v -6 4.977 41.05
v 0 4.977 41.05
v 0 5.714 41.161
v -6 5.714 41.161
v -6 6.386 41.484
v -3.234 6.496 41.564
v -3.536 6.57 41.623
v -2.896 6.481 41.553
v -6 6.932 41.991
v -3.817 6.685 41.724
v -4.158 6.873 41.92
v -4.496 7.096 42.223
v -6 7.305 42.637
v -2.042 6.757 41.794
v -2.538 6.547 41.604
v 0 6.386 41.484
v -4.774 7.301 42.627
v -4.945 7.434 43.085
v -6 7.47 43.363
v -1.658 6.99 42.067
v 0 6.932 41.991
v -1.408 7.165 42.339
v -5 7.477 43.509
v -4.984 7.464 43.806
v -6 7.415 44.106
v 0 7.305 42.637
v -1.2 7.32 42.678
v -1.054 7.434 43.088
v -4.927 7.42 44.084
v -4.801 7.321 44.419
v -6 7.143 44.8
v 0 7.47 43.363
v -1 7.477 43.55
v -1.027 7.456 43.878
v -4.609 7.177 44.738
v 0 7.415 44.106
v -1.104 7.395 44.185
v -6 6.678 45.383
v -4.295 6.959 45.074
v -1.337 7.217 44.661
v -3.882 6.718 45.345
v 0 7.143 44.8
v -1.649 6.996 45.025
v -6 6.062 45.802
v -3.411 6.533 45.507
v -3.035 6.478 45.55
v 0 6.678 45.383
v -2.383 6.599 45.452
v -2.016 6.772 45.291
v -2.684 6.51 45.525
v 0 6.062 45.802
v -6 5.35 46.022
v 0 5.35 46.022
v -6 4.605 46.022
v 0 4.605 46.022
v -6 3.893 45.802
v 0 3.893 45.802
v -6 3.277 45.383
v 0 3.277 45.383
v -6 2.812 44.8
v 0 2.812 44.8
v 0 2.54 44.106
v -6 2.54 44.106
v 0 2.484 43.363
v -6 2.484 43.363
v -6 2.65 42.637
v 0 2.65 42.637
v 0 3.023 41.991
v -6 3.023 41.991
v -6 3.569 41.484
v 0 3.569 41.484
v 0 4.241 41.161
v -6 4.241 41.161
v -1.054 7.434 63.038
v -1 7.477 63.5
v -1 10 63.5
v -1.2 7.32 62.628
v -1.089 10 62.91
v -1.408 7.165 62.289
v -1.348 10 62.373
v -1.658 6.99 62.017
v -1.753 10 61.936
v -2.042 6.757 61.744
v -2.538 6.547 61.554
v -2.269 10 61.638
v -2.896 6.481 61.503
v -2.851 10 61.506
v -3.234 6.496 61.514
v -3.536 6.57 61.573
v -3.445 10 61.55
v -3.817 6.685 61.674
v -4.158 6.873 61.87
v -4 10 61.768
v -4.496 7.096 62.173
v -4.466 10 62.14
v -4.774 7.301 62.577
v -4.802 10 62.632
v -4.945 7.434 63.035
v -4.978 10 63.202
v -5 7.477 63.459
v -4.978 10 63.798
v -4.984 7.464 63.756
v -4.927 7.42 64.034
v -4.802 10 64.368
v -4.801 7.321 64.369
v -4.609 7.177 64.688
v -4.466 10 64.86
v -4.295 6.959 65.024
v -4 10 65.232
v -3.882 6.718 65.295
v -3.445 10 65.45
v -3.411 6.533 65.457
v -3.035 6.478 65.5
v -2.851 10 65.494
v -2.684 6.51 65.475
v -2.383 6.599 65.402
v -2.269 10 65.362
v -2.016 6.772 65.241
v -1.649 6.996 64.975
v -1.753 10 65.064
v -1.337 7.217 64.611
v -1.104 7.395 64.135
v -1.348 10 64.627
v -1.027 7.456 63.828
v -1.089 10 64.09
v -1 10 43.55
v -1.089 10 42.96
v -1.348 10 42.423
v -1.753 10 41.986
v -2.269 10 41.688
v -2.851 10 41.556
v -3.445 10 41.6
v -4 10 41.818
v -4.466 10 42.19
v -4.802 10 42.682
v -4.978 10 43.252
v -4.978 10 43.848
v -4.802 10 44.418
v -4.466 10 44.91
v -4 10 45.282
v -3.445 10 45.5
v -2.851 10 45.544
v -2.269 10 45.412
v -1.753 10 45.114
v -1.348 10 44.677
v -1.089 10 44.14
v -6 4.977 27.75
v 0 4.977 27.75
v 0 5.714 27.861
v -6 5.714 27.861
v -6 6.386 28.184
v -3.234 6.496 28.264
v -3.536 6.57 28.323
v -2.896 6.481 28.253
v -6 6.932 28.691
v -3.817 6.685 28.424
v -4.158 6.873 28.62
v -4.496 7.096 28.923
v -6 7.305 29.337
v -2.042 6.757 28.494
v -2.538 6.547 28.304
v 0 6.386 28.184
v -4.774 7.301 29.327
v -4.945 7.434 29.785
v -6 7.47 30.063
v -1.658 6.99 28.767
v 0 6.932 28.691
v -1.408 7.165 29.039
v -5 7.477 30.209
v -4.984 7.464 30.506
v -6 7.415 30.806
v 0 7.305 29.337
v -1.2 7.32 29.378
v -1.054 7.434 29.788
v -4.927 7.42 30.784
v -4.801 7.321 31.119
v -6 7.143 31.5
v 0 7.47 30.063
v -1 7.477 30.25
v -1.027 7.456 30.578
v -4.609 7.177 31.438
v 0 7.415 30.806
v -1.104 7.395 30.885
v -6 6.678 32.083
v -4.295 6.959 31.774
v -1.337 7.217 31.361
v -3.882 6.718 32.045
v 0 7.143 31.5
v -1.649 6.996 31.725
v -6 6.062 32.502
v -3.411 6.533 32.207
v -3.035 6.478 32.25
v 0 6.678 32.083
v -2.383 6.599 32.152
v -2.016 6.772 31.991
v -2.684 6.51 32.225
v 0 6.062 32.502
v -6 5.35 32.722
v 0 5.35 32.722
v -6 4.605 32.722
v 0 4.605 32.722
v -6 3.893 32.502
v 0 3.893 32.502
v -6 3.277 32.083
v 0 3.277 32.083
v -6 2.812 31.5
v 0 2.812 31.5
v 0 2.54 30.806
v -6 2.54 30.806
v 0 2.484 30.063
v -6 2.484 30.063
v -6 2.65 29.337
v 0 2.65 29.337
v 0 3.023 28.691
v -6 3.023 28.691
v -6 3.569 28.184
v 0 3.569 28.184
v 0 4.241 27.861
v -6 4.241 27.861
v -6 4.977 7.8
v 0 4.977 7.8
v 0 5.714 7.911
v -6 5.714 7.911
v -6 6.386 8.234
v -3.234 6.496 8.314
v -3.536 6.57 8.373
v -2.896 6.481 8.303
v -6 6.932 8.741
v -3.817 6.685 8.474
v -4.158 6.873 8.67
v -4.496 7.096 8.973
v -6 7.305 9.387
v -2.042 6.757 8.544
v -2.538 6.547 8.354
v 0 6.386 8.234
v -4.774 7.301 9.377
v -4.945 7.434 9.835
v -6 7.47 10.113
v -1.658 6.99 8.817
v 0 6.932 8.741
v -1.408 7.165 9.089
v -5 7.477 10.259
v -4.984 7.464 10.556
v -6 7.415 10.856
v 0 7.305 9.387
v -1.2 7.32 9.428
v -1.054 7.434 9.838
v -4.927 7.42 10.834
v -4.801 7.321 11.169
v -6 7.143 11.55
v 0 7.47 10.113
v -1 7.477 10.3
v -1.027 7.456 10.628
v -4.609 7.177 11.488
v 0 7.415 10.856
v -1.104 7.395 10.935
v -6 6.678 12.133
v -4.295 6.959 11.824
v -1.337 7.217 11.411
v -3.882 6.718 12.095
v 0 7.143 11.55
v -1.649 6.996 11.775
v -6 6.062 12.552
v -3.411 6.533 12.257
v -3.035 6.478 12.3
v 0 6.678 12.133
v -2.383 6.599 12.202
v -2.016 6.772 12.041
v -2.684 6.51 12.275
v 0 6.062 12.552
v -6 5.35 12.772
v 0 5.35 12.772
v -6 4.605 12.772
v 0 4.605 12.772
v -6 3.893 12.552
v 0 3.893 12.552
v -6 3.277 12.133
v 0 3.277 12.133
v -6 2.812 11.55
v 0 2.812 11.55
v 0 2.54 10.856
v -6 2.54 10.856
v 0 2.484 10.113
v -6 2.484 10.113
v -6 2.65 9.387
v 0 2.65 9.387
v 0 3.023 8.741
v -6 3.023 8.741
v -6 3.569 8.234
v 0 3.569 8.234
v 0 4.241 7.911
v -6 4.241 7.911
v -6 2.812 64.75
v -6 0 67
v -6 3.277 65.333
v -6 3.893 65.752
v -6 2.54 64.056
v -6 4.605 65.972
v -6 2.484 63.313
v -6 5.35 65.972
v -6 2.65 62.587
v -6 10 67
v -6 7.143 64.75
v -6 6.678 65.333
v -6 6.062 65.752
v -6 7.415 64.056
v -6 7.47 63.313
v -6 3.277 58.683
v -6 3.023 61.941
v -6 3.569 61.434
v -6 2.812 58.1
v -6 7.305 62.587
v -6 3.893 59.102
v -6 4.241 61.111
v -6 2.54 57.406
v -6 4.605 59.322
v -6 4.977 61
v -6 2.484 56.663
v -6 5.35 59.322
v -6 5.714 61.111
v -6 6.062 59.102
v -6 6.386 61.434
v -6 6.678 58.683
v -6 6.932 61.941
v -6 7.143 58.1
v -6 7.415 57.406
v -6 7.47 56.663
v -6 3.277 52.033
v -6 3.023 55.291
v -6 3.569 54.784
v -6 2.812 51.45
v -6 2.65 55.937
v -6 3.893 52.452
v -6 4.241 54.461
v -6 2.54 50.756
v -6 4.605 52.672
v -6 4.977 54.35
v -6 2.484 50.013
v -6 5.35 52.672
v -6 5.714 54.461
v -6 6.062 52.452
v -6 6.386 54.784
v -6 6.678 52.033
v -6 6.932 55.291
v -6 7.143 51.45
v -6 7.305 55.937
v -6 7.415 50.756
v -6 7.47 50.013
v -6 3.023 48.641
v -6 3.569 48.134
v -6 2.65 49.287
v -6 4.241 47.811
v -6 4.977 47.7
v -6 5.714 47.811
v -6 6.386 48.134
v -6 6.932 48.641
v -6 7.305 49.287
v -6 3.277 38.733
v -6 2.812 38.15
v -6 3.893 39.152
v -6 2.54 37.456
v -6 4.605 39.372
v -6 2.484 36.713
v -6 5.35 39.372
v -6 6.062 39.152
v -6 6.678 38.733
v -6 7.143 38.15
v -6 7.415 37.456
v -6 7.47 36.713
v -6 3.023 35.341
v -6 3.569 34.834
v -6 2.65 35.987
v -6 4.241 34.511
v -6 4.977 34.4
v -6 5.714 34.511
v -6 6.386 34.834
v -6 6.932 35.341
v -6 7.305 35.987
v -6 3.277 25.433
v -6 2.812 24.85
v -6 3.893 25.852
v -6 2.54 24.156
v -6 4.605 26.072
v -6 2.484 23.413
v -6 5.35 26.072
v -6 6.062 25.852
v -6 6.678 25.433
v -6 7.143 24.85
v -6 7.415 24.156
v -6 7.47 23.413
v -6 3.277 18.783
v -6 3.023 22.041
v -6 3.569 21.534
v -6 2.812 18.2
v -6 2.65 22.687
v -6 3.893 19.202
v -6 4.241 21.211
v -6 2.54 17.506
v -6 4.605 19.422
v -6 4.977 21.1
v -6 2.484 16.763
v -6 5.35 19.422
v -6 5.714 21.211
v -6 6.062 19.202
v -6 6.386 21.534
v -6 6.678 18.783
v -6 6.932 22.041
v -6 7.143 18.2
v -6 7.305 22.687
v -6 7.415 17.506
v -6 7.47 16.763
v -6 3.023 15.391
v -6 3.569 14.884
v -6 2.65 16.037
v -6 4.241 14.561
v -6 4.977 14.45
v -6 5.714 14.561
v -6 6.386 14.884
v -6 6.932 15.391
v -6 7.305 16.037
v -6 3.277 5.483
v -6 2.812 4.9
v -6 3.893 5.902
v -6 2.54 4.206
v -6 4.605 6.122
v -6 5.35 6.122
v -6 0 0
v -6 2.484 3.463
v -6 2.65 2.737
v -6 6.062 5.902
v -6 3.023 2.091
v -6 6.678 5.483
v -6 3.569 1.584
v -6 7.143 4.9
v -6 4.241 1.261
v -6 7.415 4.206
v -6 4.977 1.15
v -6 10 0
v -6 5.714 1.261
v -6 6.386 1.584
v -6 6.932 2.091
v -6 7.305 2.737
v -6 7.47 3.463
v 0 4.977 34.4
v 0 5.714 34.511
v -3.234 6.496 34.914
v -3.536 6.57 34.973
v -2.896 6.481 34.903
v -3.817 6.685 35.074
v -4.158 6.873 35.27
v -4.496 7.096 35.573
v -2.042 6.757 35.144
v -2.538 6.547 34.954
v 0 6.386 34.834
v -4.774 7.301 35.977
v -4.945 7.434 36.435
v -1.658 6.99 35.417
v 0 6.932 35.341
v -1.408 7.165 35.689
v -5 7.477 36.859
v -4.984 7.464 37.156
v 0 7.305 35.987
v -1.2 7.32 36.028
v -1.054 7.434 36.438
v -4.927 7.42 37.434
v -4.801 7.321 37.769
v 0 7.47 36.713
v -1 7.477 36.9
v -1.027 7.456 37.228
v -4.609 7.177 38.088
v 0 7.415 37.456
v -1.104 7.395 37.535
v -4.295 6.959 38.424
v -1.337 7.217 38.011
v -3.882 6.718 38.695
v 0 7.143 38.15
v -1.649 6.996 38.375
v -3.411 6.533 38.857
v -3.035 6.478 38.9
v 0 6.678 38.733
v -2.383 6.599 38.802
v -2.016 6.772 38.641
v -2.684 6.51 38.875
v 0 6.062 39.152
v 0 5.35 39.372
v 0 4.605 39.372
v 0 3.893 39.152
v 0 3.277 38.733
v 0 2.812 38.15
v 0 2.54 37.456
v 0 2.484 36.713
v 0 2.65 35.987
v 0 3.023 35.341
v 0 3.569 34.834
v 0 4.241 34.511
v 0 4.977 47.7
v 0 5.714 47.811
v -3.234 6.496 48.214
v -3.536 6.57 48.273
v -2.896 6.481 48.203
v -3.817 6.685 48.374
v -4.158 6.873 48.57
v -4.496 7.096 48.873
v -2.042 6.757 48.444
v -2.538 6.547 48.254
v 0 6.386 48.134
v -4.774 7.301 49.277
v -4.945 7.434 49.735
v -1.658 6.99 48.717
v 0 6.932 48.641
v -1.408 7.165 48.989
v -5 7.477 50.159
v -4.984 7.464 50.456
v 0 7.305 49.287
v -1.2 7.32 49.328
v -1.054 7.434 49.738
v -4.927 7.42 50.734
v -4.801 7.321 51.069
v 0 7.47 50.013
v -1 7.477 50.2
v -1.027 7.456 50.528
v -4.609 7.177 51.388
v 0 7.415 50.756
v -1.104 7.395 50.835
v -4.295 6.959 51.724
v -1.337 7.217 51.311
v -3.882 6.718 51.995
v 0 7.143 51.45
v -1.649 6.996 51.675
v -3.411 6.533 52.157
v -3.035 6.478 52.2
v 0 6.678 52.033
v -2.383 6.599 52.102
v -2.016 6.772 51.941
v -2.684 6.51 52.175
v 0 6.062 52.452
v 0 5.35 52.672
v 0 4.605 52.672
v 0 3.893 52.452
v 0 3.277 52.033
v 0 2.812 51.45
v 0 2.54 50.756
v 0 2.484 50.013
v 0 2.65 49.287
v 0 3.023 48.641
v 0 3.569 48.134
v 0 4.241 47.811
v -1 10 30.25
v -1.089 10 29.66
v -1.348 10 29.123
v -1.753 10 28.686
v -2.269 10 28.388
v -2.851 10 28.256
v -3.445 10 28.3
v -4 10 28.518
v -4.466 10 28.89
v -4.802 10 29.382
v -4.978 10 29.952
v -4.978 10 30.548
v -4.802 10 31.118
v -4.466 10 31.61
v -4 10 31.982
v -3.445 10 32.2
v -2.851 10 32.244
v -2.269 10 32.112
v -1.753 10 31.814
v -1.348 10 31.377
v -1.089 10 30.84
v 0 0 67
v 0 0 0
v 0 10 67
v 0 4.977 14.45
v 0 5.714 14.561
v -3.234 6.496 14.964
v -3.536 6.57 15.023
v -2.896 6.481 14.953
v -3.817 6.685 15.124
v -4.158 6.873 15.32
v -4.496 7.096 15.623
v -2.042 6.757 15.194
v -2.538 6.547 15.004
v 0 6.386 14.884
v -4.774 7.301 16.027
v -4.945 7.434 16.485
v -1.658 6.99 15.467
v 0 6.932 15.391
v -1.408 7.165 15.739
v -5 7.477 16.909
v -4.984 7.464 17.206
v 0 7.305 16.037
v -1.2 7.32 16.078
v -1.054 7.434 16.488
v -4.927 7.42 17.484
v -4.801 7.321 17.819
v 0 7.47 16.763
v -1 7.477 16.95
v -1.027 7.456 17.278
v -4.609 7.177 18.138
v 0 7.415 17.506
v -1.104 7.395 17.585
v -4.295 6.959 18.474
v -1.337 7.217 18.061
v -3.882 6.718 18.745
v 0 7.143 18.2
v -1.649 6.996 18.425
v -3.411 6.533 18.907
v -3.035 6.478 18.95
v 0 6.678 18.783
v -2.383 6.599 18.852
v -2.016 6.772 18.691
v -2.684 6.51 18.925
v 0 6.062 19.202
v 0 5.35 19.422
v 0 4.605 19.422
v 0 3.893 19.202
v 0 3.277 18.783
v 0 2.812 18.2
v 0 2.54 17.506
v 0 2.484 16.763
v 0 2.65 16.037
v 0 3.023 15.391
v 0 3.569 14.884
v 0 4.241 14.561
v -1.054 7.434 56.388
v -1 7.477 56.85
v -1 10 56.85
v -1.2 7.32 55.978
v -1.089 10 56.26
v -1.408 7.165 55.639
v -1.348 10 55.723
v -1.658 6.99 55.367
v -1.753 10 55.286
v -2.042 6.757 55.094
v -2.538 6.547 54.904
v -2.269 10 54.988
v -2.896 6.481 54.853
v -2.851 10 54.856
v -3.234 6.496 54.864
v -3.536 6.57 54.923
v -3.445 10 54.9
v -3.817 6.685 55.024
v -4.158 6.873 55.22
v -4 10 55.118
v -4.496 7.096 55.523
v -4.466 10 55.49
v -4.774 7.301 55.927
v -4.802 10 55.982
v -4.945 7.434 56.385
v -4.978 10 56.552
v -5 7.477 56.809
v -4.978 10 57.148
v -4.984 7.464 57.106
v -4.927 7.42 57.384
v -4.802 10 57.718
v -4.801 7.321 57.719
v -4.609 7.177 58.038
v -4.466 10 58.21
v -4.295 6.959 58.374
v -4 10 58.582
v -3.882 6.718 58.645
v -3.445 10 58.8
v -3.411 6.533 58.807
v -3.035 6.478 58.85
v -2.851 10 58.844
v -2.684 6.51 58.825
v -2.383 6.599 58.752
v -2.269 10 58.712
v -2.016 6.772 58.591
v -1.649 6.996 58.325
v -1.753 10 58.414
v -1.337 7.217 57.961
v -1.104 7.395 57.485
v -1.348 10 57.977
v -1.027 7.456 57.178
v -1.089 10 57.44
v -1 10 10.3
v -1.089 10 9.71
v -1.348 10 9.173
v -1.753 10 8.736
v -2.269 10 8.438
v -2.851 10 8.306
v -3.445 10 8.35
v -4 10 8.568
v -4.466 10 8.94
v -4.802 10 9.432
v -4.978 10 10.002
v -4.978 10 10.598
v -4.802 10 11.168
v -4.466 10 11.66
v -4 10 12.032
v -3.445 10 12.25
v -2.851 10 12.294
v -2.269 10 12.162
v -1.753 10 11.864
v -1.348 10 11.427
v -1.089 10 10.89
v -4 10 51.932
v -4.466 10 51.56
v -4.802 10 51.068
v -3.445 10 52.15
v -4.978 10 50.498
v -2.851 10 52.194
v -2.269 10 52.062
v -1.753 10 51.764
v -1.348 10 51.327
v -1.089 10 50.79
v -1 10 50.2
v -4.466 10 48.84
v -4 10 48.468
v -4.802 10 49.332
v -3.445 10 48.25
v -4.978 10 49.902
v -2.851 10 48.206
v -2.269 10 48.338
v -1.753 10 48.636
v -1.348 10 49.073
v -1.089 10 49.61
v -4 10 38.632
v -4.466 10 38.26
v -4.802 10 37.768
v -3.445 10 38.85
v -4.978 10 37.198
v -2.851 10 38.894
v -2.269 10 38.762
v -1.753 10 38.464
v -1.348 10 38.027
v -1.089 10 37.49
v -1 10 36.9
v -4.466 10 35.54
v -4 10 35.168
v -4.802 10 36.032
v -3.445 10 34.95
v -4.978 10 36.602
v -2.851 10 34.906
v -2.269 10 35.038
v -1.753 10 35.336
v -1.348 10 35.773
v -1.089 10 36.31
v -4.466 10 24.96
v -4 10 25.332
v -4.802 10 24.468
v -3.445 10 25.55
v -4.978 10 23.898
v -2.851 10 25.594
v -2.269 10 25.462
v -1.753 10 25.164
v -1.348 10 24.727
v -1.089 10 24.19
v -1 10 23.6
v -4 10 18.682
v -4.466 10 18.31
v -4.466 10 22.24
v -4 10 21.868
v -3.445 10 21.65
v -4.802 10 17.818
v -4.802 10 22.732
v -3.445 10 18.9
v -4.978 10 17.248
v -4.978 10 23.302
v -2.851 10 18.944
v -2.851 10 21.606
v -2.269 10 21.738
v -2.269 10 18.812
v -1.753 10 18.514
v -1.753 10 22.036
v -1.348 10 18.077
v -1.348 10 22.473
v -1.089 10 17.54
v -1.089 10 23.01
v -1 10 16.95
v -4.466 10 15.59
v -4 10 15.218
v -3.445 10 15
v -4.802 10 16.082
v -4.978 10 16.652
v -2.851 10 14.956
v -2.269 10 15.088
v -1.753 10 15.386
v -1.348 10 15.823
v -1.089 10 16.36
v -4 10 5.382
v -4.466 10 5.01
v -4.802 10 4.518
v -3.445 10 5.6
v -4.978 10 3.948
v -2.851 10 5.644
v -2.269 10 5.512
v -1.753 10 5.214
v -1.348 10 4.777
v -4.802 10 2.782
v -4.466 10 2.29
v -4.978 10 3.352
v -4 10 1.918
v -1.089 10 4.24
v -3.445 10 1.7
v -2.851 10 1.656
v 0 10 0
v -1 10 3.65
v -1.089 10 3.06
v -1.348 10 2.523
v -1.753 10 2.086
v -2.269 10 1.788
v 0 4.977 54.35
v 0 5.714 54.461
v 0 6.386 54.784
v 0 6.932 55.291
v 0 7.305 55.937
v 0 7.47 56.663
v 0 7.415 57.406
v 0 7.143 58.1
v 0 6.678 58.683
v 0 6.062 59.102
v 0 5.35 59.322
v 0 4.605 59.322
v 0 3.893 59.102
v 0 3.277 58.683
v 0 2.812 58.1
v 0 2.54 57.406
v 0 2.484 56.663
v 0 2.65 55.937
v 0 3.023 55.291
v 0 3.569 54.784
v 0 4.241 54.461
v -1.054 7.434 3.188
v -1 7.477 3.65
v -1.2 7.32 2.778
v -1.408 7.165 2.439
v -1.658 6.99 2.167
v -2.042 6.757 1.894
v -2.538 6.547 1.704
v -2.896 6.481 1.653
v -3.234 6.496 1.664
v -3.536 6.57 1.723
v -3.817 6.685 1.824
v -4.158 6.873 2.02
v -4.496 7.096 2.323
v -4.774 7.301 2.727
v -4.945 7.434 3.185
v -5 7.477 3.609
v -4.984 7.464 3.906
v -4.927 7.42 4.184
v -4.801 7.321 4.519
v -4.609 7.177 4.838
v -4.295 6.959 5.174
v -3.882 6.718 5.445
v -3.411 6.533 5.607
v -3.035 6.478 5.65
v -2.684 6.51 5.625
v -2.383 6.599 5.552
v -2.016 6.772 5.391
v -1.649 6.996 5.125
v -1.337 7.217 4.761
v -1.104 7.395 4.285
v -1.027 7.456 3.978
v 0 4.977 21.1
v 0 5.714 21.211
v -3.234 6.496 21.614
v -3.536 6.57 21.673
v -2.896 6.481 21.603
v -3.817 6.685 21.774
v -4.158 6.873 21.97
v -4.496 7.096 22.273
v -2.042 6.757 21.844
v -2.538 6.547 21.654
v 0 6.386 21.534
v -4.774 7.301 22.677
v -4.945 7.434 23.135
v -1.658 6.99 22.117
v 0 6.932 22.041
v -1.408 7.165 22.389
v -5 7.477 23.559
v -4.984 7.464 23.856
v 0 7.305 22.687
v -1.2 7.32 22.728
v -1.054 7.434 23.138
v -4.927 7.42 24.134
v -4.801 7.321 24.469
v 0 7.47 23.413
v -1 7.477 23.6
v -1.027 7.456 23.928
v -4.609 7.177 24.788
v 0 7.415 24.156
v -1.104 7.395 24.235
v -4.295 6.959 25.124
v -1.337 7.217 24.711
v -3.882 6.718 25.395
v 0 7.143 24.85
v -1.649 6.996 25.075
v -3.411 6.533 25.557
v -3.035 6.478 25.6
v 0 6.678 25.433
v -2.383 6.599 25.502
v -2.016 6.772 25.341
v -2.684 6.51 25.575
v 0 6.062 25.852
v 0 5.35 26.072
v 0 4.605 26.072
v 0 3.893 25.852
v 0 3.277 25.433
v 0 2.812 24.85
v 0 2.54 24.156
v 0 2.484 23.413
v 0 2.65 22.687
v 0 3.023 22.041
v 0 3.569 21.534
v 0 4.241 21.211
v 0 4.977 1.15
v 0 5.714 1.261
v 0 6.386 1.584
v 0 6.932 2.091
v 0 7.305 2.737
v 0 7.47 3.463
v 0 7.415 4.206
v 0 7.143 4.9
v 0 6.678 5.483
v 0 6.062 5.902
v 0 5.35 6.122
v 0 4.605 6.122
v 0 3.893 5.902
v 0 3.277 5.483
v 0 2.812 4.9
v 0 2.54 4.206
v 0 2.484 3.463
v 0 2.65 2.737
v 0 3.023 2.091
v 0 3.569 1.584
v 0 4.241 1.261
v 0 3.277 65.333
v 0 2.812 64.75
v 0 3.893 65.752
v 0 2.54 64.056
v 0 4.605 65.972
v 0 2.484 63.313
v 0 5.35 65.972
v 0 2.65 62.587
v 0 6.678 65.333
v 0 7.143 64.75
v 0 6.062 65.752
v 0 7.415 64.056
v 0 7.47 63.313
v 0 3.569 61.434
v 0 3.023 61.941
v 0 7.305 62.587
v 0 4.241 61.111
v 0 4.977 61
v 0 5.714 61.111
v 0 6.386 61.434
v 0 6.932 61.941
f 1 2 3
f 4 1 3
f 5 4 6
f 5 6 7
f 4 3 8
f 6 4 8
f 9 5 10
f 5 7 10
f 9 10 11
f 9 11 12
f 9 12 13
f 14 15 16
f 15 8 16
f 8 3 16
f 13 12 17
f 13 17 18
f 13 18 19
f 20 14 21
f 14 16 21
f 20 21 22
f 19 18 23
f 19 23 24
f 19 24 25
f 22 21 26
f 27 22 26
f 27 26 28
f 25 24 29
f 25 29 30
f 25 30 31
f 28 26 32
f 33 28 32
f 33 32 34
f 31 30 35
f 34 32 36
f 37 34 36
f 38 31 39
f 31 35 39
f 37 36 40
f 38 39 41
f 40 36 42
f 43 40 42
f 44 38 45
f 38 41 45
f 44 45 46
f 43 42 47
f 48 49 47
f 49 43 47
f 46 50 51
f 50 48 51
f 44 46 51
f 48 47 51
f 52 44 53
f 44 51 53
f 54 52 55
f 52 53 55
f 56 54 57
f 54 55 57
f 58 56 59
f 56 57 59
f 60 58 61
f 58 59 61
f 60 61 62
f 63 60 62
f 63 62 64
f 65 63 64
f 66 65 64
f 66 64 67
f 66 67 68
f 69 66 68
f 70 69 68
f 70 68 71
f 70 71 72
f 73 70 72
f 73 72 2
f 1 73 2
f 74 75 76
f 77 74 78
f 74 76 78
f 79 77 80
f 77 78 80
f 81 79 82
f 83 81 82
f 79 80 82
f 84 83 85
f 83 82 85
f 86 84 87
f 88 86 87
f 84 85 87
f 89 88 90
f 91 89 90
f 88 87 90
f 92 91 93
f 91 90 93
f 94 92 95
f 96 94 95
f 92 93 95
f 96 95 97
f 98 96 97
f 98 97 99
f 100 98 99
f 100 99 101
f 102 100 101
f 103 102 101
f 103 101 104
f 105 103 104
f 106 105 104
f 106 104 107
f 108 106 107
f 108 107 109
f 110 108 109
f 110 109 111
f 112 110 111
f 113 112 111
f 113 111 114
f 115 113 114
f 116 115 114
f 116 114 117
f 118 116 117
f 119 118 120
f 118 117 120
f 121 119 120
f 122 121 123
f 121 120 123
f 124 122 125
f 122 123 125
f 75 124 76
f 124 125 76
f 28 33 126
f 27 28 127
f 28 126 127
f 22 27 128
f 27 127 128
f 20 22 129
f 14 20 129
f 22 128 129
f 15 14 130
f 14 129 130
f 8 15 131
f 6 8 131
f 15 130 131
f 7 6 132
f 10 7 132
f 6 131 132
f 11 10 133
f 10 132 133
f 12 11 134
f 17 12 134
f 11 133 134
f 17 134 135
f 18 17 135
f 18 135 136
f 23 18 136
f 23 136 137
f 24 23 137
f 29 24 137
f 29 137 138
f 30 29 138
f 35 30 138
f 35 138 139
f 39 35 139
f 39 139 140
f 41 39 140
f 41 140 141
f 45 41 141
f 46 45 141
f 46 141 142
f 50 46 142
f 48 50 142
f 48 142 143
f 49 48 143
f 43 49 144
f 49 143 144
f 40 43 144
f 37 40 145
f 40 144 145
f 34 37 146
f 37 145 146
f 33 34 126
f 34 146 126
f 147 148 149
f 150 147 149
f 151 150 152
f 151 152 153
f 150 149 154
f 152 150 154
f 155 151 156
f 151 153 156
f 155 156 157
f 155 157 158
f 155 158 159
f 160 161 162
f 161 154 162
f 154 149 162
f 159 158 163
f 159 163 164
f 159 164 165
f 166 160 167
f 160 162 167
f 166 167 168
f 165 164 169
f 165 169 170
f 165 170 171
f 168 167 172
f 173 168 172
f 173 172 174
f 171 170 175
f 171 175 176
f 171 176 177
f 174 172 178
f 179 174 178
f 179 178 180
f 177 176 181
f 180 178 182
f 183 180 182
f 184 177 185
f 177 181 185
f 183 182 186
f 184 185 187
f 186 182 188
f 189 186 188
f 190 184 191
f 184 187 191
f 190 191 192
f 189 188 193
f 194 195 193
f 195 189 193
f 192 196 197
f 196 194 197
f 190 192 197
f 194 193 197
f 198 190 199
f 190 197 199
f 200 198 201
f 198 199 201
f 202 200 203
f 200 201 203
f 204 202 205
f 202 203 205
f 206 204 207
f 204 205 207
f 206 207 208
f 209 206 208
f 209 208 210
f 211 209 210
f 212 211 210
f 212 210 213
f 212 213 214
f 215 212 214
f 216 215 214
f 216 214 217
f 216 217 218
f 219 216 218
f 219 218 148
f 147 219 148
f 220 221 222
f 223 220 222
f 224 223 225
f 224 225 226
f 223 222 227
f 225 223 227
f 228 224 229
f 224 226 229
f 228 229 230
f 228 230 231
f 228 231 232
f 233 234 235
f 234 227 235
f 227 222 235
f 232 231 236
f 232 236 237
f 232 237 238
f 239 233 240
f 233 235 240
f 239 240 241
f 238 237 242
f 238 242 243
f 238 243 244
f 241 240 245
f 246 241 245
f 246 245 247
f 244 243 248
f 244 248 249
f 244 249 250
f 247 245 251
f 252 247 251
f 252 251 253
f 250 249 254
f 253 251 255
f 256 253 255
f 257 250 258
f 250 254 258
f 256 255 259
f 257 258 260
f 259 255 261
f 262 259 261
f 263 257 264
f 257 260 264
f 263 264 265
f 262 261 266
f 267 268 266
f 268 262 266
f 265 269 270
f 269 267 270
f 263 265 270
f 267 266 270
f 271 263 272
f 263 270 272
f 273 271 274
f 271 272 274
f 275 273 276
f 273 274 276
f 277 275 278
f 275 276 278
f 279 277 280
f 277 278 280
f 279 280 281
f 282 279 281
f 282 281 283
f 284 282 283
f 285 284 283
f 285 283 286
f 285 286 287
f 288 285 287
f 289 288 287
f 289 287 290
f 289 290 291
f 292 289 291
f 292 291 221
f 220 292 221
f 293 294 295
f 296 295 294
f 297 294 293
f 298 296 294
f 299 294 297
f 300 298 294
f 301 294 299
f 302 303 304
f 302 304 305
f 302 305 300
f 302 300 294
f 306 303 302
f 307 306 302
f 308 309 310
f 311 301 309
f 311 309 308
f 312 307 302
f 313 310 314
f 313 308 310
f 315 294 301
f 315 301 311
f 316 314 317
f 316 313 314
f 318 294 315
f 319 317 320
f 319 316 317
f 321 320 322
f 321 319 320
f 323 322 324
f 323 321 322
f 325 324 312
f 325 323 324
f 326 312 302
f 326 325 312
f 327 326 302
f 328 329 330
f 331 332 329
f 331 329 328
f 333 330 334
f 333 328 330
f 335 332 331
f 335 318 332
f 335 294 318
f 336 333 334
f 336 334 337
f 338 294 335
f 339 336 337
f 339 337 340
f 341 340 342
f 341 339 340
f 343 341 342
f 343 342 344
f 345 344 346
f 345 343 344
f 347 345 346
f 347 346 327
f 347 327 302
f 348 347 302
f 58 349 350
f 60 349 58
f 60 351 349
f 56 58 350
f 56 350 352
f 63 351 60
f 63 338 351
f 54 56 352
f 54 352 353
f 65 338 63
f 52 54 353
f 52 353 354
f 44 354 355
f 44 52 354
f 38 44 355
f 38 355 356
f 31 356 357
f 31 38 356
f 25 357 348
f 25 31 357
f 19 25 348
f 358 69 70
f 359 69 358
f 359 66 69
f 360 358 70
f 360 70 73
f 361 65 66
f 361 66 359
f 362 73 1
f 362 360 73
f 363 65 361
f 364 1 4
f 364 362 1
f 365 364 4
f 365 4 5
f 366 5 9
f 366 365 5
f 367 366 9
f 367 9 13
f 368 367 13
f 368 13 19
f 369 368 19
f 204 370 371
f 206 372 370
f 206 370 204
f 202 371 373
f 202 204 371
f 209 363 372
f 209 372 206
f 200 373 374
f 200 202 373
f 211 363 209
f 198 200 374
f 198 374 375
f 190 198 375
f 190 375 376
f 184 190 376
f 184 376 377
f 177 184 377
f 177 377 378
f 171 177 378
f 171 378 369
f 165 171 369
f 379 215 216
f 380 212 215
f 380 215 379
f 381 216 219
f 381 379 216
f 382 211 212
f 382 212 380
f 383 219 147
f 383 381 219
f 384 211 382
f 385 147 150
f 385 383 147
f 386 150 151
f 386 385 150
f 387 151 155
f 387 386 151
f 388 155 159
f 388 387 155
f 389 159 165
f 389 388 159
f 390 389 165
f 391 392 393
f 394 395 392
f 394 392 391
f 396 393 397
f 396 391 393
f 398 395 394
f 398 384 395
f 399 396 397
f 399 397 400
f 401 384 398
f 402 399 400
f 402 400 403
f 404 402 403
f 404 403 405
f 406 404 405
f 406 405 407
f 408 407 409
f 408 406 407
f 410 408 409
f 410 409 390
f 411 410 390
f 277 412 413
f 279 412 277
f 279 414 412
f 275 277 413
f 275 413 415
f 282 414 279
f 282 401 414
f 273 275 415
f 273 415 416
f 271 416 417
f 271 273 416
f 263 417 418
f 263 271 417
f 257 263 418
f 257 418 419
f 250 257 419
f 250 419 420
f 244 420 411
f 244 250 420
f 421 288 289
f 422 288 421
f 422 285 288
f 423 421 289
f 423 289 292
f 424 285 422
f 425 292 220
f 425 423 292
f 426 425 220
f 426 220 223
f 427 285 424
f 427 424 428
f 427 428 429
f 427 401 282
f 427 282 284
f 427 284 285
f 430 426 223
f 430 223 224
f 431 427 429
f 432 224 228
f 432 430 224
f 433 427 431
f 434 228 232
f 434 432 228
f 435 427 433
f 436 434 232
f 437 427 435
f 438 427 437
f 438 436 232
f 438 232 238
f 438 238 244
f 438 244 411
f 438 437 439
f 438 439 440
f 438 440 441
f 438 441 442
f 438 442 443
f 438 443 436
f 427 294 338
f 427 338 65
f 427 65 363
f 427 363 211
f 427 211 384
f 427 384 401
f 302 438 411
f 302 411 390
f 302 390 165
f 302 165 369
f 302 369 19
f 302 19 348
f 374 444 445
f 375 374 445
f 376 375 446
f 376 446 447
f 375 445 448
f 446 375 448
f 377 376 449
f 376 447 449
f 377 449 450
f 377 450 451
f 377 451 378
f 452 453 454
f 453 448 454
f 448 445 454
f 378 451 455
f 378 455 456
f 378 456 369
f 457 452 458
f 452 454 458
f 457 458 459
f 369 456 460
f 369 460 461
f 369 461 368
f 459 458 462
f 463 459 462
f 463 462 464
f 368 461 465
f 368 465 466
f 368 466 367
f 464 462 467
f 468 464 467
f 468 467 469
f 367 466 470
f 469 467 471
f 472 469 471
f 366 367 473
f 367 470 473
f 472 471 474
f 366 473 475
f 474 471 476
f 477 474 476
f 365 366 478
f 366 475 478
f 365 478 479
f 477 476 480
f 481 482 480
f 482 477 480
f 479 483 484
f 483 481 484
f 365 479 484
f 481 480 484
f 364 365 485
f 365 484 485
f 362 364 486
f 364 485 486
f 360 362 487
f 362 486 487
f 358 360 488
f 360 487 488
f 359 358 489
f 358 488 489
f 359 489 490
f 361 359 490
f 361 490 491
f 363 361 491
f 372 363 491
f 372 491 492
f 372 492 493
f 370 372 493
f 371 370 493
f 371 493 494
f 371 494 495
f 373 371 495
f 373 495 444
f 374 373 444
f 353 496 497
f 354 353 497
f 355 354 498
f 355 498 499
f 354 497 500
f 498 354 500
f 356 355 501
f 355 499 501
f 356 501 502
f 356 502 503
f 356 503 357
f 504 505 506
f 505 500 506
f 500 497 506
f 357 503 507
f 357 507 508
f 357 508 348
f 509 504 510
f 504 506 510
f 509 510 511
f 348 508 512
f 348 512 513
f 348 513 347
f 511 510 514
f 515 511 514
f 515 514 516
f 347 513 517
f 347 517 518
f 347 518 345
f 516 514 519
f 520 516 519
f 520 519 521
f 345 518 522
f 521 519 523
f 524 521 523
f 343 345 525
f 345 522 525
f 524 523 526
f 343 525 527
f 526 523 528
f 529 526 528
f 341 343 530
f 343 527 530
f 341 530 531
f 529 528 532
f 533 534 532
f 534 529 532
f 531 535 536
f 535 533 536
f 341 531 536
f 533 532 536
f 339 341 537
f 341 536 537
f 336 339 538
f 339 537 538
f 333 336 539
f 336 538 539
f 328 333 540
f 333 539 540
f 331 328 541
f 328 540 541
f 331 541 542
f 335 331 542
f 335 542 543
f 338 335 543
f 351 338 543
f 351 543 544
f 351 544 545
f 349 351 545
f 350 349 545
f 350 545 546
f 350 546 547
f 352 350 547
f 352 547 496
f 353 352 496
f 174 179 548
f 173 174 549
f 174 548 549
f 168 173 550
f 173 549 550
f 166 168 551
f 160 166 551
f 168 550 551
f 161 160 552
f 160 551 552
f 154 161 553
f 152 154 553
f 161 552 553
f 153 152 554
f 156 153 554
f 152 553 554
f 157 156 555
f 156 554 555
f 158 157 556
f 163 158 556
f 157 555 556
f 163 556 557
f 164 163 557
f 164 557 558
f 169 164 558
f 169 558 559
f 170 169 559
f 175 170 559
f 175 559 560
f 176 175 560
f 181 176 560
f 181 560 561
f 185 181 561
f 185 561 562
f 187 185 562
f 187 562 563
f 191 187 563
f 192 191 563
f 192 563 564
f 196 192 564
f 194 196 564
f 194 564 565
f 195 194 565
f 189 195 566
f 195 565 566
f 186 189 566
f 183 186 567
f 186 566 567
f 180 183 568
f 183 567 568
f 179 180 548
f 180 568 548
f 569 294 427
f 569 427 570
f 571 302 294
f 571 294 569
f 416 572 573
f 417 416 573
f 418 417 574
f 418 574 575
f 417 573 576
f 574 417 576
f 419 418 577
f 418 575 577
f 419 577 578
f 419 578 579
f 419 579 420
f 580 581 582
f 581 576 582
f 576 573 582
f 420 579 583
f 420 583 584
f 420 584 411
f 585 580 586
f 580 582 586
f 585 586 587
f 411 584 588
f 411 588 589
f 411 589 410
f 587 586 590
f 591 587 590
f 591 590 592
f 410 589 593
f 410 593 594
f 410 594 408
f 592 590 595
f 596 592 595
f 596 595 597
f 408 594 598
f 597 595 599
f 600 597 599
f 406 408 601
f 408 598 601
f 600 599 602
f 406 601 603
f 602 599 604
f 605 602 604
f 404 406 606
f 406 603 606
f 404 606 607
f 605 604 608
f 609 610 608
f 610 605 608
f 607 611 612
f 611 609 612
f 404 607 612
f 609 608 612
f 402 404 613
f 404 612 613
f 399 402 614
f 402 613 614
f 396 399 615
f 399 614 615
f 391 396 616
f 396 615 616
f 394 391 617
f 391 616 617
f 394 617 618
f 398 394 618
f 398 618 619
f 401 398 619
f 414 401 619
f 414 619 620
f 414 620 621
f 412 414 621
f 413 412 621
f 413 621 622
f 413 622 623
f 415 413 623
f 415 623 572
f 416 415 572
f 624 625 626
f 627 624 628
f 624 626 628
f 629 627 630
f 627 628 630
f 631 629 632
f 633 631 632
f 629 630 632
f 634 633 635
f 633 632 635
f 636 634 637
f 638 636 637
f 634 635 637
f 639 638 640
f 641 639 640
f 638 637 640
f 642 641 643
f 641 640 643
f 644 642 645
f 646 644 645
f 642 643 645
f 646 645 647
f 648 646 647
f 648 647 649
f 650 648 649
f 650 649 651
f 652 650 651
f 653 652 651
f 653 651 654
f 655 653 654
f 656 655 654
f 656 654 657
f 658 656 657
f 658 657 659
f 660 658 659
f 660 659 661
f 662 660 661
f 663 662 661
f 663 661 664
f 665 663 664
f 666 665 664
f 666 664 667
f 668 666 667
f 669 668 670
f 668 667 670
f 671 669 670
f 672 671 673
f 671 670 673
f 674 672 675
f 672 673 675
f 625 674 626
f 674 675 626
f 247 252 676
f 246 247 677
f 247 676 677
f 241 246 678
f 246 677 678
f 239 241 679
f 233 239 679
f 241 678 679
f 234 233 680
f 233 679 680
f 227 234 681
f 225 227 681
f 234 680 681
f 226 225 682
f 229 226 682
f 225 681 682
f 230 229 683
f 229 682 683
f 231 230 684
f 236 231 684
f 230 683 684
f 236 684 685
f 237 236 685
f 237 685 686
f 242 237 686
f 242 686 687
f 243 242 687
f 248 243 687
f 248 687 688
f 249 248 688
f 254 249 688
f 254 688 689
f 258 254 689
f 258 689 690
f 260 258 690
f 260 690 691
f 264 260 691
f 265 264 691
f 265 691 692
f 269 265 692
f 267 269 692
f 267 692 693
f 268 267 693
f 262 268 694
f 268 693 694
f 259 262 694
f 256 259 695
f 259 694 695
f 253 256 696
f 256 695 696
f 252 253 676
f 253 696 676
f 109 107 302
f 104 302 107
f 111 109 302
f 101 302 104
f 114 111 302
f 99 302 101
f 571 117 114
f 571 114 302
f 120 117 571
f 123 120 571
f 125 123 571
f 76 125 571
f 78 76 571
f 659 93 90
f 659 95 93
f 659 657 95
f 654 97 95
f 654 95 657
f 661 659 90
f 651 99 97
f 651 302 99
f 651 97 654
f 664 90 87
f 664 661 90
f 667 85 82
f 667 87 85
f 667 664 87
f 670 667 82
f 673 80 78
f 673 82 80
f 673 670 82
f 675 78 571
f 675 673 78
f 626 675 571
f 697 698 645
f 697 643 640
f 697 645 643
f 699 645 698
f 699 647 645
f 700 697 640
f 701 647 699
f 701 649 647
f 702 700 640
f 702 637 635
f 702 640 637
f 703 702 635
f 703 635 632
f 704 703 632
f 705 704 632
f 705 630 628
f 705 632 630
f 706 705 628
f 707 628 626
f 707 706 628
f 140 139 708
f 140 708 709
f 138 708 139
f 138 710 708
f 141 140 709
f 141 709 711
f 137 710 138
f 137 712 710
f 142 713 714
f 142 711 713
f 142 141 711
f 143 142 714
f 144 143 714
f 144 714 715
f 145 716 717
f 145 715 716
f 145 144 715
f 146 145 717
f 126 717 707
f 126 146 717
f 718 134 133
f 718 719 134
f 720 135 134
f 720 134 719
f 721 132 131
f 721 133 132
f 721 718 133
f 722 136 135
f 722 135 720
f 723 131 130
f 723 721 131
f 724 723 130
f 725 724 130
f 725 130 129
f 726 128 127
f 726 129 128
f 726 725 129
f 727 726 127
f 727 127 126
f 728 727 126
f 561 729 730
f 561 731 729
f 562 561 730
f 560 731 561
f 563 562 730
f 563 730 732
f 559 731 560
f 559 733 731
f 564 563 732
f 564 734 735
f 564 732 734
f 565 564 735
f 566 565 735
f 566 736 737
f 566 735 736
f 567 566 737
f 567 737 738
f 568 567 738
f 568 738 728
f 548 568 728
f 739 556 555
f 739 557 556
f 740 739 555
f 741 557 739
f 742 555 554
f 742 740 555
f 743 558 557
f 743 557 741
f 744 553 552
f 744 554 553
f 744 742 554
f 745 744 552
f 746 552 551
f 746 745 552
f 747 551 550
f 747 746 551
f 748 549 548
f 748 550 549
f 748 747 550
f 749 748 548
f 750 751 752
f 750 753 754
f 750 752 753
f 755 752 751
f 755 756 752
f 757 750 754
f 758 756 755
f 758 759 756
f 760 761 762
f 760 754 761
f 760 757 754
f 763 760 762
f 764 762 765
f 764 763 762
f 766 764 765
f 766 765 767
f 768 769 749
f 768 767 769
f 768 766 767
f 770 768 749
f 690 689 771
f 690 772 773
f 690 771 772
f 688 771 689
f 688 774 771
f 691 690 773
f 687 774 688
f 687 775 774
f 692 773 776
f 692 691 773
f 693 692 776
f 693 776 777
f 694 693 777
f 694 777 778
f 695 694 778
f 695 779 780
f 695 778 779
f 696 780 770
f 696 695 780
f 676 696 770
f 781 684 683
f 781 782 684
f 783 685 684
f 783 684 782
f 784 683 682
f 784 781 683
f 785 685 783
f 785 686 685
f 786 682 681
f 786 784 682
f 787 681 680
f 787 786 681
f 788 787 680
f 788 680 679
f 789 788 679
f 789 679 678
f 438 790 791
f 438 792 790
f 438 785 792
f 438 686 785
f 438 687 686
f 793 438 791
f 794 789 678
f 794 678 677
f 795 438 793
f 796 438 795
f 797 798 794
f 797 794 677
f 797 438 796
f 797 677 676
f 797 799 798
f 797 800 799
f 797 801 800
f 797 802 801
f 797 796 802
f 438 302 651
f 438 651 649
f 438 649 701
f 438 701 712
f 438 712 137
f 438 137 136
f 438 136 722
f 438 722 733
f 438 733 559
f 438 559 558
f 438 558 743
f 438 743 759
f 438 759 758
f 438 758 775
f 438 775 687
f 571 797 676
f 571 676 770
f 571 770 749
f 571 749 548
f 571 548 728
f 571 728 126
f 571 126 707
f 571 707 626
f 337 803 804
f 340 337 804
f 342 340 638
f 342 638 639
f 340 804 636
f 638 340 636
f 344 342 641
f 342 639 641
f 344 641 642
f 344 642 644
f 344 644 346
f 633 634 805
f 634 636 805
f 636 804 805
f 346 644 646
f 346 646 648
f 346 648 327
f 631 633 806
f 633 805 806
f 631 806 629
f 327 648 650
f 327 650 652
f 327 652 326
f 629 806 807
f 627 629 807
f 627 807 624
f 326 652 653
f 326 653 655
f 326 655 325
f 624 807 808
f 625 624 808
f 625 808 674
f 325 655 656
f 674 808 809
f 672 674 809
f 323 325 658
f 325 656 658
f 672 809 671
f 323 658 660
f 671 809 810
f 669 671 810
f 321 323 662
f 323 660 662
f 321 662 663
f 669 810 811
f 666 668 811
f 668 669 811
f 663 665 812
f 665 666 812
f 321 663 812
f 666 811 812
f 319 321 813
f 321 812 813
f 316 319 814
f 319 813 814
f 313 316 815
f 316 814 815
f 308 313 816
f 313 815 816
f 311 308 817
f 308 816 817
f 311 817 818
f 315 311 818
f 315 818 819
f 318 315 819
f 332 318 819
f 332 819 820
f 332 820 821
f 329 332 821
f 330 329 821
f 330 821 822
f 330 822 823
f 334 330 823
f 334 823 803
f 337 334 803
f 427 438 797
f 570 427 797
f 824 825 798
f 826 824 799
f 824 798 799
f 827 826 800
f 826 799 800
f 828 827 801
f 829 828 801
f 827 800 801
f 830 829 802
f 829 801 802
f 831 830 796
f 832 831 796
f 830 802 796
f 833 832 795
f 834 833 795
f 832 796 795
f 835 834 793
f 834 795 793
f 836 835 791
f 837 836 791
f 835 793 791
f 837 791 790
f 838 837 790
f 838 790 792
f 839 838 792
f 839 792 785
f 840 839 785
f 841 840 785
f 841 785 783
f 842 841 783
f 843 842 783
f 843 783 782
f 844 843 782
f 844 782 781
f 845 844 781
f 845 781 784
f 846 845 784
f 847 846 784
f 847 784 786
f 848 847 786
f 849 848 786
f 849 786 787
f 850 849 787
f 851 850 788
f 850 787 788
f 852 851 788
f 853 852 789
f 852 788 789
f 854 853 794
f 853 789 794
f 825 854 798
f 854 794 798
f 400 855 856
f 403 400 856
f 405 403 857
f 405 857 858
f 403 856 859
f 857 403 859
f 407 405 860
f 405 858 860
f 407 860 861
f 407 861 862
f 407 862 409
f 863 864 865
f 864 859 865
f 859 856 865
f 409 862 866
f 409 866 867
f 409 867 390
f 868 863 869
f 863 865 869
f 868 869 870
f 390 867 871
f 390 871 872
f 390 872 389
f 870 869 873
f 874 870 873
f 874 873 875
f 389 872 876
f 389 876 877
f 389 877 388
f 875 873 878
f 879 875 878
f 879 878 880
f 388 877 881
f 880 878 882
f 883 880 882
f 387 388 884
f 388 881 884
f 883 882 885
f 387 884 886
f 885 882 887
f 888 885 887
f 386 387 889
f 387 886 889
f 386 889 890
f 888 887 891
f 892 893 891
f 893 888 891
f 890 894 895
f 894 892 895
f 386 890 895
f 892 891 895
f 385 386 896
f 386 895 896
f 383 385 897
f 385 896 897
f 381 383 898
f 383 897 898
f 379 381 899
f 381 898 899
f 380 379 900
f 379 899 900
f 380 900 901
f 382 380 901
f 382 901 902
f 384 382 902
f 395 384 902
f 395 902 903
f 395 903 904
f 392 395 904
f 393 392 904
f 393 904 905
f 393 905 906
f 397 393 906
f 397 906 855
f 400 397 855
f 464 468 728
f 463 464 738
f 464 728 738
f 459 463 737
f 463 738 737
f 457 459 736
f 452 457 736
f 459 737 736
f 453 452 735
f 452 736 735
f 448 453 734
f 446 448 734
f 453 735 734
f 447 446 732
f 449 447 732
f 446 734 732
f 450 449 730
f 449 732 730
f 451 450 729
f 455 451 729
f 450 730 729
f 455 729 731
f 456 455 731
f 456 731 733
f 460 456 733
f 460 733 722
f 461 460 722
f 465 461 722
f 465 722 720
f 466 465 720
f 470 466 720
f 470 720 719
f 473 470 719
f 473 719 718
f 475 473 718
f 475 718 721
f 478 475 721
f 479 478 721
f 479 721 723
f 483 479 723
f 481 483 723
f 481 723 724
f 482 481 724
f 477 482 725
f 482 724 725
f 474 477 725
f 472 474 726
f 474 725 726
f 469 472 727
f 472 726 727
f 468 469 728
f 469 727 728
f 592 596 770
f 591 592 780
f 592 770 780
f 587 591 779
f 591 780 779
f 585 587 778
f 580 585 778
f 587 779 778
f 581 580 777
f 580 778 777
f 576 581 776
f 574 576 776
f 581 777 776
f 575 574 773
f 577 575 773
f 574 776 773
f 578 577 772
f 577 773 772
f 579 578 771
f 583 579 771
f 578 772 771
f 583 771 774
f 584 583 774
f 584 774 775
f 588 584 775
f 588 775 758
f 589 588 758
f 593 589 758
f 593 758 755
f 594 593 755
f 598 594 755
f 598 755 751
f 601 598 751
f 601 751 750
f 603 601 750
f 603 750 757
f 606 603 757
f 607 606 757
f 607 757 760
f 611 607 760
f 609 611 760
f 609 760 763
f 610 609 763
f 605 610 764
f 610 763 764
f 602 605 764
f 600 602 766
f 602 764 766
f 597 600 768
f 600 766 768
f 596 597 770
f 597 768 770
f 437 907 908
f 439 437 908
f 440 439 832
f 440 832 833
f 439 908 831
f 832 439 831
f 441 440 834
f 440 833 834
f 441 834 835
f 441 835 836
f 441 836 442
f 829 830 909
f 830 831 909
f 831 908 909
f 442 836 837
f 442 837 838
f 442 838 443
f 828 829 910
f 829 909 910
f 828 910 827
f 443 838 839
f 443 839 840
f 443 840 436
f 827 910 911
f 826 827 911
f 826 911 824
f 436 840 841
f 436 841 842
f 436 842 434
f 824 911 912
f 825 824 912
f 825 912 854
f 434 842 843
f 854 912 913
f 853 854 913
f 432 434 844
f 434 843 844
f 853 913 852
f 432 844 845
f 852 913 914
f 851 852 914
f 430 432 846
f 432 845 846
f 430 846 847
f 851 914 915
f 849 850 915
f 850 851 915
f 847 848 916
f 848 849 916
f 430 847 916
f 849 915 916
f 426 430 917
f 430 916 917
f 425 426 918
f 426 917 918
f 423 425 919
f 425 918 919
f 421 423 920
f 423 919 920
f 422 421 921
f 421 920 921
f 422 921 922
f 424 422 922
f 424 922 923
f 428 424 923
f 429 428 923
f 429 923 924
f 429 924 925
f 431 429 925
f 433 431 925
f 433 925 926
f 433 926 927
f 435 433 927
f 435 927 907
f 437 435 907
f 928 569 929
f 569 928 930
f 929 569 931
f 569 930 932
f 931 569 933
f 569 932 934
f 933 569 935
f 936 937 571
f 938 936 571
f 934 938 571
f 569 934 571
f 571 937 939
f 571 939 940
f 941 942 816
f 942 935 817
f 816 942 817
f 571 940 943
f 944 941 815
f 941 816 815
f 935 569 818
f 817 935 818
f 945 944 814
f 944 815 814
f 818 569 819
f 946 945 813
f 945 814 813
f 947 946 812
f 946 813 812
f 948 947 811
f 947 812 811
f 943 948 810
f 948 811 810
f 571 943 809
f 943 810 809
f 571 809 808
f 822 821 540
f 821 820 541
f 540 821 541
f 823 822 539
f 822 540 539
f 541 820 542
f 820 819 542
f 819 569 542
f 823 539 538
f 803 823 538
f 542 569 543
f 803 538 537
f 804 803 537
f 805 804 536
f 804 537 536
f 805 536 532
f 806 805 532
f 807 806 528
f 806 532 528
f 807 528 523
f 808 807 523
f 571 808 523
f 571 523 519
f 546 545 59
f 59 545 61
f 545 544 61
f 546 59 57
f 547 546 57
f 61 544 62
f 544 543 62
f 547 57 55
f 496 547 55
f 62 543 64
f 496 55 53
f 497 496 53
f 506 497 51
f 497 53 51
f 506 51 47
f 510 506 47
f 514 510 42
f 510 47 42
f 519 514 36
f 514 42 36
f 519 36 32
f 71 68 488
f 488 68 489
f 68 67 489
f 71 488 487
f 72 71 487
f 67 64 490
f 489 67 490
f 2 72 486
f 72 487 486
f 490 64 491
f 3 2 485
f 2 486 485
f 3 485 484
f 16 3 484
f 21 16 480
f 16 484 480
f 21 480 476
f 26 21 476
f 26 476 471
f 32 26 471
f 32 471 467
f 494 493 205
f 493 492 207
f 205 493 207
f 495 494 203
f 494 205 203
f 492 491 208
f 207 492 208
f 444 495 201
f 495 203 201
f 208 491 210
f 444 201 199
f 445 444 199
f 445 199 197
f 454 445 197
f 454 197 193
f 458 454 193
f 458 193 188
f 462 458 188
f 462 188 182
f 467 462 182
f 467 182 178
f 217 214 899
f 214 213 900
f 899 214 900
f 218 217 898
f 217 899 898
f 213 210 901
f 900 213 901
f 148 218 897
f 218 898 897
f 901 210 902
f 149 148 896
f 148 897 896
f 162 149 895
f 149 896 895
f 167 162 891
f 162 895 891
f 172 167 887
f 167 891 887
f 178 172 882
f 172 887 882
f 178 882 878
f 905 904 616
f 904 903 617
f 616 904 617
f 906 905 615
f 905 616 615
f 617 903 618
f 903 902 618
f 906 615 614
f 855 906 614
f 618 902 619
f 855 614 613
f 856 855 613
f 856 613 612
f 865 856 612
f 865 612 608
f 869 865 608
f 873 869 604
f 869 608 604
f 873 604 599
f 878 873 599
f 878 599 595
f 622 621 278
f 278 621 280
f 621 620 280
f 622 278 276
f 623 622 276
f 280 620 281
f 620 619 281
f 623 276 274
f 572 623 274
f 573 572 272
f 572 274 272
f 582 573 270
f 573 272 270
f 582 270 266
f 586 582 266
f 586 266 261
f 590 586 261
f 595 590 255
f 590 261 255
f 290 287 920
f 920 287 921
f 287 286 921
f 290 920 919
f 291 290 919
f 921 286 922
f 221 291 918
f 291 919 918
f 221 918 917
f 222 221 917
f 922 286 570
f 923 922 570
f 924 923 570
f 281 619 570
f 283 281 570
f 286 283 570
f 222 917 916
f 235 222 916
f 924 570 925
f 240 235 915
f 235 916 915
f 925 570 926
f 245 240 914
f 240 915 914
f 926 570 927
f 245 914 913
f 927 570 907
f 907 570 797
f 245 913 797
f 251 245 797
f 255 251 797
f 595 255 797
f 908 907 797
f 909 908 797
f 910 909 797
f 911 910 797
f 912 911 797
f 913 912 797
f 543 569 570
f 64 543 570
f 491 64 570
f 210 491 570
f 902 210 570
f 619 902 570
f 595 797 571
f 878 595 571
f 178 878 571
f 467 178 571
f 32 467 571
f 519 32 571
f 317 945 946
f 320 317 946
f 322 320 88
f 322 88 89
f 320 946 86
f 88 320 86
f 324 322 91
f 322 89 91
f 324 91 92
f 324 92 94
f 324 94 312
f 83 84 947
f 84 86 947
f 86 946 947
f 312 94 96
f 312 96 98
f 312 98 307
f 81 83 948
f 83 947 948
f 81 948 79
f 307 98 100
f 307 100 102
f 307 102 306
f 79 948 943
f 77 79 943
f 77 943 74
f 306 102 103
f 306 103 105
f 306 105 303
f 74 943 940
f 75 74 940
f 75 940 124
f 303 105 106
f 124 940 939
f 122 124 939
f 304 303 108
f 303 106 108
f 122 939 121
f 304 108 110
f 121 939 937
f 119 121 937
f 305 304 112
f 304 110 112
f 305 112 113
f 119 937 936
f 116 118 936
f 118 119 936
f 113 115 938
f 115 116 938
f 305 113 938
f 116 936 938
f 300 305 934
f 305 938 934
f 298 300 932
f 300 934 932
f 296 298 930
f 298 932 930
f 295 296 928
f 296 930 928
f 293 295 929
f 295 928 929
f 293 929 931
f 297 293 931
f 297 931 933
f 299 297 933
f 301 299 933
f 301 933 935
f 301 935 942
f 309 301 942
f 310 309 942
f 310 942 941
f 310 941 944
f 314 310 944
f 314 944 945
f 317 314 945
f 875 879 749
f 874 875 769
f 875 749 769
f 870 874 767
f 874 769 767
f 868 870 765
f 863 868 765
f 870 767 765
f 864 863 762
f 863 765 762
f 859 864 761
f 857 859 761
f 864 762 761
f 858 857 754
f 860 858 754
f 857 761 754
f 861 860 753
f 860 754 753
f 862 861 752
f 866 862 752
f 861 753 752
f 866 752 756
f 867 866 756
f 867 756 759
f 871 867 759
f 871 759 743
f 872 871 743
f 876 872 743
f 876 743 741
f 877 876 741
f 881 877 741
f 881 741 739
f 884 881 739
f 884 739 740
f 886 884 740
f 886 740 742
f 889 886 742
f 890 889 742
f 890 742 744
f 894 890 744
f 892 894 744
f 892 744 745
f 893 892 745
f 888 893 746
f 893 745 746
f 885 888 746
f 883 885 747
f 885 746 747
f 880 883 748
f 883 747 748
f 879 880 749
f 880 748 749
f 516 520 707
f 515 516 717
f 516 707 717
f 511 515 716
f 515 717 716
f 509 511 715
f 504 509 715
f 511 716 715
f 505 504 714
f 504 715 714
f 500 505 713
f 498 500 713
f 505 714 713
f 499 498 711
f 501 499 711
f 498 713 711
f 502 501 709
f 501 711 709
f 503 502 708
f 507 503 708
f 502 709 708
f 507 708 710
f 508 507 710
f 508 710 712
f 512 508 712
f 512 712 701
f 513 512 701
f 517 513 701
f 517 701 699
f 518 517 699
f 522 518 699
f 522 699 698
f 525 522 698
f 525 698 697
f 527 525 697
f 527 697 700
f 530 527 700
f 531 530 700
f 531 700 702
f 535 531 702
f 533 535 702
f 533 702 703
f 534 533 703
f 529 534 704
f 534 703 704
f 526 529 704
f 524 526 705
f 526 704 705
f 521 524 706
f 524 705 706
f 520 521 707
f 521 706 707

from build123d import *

# Parameters (mm, degrees)
ESBO_O1_W                = 6
ESBO_O1_H                = 10
RESSALTO_EXTRUS_O1_DEPTH = 67
ESBO_O2_R                = 2.5
CORTE_EXTRUS_O1_DEPTH    = 67
ESBO_O3_R                = 2
CORTE_EXTRUS_O2_DEPTH    = 6


with BuildPart() as part:
    # Esboço1 → Ressalto-extrusão1 (new body)
    with BuildSketch(Plane.XY):
        with Locations((-3, 5)):
            Rectangle(ESBO_O1_W, ESBO_O1_H)
    extrude(amount=RESSALTO_EXTRUS_O1_DEPTH)

    # Esboço2 → Corte-extrusão1 (cut)
    with BuildSketch(Plane(origin=(0, 0, 0), x_dir=(0, 0, -1), z_dir=(1, 0, 0))):
        with Locations((-63.5, 4.977459114)):
            Circle(ESBO_O2_R)
        with Locations((-56.85, 4.977459114)):
            Circle(ESBO_O2_R)
        with Locations((-50.2, 4.977459114)):
            Circle(ESBO_O2_R)
        with Locations((-43.55, 4.977459114)):
            Circle(ESBO_O2_R)
        with Locations((-36.9, 4.977459114)):
            Circle(ESBO_O2_R)
        with Locations((-30.25, 4.977459114)):
            Circle(ESBO_O2_R)
        with Locations((-23.6, 4.977459114)):
            Circle(ESBO_O2_R)
        with Locations((-16.95, 4.977459114)):
            Circle(ESBO_O2_R)
        with Locations((-10.3, 4.977459114)):
            Circle(ESBO_O2_R)
        with Locations((-3.65, 4.977459114)):
            Circle(ESBO_O2_R)
    extrude(amount=-CORTE_EXTRUS_O1_DEPTH, mode=Mode.SUBTRACT)

    # Esboço3 → Corte-extrusão2 (cut)
    with BuildSketch(Plane(origin=(0, 10, 0), x_dir=(1, 0, 0), z_dir=(0, 1, 0))):
        with Locations((-3, -63.5)):
            Circle(ESBO_O3_R)
        with Locations((-3, -56.85)):
            Circle(ESBO_O3_R)
        with Locations((-3, -50.2)):
            Circle(ESBO_O3_R)
        with Locations((-3, -43.55)):
            Circle(ESBO_O3_R)
        with Locations((-3, -36.9)):
            Circle(ESBO_O3_R)
        with Locations((-3, -30.25)):
            Circle(ESBO_O3_R)
        with Locations((-3, -23.6)):
            Circle(ESBO_O3_R)
        with Locations((-3, -16.95)):
            Circle(ESBO_O3_R)
        with Locations((-3, -10.3)):
            Circle(ESBO_O3_R)
        with Locations((-3, -3.65)):
            Circle(ESBO_O3_R)
    extrude(amount=-CORTE_EXTRUS_O2_DEPTH, mode=Mode.SUBTRACT)


solid = part.part
